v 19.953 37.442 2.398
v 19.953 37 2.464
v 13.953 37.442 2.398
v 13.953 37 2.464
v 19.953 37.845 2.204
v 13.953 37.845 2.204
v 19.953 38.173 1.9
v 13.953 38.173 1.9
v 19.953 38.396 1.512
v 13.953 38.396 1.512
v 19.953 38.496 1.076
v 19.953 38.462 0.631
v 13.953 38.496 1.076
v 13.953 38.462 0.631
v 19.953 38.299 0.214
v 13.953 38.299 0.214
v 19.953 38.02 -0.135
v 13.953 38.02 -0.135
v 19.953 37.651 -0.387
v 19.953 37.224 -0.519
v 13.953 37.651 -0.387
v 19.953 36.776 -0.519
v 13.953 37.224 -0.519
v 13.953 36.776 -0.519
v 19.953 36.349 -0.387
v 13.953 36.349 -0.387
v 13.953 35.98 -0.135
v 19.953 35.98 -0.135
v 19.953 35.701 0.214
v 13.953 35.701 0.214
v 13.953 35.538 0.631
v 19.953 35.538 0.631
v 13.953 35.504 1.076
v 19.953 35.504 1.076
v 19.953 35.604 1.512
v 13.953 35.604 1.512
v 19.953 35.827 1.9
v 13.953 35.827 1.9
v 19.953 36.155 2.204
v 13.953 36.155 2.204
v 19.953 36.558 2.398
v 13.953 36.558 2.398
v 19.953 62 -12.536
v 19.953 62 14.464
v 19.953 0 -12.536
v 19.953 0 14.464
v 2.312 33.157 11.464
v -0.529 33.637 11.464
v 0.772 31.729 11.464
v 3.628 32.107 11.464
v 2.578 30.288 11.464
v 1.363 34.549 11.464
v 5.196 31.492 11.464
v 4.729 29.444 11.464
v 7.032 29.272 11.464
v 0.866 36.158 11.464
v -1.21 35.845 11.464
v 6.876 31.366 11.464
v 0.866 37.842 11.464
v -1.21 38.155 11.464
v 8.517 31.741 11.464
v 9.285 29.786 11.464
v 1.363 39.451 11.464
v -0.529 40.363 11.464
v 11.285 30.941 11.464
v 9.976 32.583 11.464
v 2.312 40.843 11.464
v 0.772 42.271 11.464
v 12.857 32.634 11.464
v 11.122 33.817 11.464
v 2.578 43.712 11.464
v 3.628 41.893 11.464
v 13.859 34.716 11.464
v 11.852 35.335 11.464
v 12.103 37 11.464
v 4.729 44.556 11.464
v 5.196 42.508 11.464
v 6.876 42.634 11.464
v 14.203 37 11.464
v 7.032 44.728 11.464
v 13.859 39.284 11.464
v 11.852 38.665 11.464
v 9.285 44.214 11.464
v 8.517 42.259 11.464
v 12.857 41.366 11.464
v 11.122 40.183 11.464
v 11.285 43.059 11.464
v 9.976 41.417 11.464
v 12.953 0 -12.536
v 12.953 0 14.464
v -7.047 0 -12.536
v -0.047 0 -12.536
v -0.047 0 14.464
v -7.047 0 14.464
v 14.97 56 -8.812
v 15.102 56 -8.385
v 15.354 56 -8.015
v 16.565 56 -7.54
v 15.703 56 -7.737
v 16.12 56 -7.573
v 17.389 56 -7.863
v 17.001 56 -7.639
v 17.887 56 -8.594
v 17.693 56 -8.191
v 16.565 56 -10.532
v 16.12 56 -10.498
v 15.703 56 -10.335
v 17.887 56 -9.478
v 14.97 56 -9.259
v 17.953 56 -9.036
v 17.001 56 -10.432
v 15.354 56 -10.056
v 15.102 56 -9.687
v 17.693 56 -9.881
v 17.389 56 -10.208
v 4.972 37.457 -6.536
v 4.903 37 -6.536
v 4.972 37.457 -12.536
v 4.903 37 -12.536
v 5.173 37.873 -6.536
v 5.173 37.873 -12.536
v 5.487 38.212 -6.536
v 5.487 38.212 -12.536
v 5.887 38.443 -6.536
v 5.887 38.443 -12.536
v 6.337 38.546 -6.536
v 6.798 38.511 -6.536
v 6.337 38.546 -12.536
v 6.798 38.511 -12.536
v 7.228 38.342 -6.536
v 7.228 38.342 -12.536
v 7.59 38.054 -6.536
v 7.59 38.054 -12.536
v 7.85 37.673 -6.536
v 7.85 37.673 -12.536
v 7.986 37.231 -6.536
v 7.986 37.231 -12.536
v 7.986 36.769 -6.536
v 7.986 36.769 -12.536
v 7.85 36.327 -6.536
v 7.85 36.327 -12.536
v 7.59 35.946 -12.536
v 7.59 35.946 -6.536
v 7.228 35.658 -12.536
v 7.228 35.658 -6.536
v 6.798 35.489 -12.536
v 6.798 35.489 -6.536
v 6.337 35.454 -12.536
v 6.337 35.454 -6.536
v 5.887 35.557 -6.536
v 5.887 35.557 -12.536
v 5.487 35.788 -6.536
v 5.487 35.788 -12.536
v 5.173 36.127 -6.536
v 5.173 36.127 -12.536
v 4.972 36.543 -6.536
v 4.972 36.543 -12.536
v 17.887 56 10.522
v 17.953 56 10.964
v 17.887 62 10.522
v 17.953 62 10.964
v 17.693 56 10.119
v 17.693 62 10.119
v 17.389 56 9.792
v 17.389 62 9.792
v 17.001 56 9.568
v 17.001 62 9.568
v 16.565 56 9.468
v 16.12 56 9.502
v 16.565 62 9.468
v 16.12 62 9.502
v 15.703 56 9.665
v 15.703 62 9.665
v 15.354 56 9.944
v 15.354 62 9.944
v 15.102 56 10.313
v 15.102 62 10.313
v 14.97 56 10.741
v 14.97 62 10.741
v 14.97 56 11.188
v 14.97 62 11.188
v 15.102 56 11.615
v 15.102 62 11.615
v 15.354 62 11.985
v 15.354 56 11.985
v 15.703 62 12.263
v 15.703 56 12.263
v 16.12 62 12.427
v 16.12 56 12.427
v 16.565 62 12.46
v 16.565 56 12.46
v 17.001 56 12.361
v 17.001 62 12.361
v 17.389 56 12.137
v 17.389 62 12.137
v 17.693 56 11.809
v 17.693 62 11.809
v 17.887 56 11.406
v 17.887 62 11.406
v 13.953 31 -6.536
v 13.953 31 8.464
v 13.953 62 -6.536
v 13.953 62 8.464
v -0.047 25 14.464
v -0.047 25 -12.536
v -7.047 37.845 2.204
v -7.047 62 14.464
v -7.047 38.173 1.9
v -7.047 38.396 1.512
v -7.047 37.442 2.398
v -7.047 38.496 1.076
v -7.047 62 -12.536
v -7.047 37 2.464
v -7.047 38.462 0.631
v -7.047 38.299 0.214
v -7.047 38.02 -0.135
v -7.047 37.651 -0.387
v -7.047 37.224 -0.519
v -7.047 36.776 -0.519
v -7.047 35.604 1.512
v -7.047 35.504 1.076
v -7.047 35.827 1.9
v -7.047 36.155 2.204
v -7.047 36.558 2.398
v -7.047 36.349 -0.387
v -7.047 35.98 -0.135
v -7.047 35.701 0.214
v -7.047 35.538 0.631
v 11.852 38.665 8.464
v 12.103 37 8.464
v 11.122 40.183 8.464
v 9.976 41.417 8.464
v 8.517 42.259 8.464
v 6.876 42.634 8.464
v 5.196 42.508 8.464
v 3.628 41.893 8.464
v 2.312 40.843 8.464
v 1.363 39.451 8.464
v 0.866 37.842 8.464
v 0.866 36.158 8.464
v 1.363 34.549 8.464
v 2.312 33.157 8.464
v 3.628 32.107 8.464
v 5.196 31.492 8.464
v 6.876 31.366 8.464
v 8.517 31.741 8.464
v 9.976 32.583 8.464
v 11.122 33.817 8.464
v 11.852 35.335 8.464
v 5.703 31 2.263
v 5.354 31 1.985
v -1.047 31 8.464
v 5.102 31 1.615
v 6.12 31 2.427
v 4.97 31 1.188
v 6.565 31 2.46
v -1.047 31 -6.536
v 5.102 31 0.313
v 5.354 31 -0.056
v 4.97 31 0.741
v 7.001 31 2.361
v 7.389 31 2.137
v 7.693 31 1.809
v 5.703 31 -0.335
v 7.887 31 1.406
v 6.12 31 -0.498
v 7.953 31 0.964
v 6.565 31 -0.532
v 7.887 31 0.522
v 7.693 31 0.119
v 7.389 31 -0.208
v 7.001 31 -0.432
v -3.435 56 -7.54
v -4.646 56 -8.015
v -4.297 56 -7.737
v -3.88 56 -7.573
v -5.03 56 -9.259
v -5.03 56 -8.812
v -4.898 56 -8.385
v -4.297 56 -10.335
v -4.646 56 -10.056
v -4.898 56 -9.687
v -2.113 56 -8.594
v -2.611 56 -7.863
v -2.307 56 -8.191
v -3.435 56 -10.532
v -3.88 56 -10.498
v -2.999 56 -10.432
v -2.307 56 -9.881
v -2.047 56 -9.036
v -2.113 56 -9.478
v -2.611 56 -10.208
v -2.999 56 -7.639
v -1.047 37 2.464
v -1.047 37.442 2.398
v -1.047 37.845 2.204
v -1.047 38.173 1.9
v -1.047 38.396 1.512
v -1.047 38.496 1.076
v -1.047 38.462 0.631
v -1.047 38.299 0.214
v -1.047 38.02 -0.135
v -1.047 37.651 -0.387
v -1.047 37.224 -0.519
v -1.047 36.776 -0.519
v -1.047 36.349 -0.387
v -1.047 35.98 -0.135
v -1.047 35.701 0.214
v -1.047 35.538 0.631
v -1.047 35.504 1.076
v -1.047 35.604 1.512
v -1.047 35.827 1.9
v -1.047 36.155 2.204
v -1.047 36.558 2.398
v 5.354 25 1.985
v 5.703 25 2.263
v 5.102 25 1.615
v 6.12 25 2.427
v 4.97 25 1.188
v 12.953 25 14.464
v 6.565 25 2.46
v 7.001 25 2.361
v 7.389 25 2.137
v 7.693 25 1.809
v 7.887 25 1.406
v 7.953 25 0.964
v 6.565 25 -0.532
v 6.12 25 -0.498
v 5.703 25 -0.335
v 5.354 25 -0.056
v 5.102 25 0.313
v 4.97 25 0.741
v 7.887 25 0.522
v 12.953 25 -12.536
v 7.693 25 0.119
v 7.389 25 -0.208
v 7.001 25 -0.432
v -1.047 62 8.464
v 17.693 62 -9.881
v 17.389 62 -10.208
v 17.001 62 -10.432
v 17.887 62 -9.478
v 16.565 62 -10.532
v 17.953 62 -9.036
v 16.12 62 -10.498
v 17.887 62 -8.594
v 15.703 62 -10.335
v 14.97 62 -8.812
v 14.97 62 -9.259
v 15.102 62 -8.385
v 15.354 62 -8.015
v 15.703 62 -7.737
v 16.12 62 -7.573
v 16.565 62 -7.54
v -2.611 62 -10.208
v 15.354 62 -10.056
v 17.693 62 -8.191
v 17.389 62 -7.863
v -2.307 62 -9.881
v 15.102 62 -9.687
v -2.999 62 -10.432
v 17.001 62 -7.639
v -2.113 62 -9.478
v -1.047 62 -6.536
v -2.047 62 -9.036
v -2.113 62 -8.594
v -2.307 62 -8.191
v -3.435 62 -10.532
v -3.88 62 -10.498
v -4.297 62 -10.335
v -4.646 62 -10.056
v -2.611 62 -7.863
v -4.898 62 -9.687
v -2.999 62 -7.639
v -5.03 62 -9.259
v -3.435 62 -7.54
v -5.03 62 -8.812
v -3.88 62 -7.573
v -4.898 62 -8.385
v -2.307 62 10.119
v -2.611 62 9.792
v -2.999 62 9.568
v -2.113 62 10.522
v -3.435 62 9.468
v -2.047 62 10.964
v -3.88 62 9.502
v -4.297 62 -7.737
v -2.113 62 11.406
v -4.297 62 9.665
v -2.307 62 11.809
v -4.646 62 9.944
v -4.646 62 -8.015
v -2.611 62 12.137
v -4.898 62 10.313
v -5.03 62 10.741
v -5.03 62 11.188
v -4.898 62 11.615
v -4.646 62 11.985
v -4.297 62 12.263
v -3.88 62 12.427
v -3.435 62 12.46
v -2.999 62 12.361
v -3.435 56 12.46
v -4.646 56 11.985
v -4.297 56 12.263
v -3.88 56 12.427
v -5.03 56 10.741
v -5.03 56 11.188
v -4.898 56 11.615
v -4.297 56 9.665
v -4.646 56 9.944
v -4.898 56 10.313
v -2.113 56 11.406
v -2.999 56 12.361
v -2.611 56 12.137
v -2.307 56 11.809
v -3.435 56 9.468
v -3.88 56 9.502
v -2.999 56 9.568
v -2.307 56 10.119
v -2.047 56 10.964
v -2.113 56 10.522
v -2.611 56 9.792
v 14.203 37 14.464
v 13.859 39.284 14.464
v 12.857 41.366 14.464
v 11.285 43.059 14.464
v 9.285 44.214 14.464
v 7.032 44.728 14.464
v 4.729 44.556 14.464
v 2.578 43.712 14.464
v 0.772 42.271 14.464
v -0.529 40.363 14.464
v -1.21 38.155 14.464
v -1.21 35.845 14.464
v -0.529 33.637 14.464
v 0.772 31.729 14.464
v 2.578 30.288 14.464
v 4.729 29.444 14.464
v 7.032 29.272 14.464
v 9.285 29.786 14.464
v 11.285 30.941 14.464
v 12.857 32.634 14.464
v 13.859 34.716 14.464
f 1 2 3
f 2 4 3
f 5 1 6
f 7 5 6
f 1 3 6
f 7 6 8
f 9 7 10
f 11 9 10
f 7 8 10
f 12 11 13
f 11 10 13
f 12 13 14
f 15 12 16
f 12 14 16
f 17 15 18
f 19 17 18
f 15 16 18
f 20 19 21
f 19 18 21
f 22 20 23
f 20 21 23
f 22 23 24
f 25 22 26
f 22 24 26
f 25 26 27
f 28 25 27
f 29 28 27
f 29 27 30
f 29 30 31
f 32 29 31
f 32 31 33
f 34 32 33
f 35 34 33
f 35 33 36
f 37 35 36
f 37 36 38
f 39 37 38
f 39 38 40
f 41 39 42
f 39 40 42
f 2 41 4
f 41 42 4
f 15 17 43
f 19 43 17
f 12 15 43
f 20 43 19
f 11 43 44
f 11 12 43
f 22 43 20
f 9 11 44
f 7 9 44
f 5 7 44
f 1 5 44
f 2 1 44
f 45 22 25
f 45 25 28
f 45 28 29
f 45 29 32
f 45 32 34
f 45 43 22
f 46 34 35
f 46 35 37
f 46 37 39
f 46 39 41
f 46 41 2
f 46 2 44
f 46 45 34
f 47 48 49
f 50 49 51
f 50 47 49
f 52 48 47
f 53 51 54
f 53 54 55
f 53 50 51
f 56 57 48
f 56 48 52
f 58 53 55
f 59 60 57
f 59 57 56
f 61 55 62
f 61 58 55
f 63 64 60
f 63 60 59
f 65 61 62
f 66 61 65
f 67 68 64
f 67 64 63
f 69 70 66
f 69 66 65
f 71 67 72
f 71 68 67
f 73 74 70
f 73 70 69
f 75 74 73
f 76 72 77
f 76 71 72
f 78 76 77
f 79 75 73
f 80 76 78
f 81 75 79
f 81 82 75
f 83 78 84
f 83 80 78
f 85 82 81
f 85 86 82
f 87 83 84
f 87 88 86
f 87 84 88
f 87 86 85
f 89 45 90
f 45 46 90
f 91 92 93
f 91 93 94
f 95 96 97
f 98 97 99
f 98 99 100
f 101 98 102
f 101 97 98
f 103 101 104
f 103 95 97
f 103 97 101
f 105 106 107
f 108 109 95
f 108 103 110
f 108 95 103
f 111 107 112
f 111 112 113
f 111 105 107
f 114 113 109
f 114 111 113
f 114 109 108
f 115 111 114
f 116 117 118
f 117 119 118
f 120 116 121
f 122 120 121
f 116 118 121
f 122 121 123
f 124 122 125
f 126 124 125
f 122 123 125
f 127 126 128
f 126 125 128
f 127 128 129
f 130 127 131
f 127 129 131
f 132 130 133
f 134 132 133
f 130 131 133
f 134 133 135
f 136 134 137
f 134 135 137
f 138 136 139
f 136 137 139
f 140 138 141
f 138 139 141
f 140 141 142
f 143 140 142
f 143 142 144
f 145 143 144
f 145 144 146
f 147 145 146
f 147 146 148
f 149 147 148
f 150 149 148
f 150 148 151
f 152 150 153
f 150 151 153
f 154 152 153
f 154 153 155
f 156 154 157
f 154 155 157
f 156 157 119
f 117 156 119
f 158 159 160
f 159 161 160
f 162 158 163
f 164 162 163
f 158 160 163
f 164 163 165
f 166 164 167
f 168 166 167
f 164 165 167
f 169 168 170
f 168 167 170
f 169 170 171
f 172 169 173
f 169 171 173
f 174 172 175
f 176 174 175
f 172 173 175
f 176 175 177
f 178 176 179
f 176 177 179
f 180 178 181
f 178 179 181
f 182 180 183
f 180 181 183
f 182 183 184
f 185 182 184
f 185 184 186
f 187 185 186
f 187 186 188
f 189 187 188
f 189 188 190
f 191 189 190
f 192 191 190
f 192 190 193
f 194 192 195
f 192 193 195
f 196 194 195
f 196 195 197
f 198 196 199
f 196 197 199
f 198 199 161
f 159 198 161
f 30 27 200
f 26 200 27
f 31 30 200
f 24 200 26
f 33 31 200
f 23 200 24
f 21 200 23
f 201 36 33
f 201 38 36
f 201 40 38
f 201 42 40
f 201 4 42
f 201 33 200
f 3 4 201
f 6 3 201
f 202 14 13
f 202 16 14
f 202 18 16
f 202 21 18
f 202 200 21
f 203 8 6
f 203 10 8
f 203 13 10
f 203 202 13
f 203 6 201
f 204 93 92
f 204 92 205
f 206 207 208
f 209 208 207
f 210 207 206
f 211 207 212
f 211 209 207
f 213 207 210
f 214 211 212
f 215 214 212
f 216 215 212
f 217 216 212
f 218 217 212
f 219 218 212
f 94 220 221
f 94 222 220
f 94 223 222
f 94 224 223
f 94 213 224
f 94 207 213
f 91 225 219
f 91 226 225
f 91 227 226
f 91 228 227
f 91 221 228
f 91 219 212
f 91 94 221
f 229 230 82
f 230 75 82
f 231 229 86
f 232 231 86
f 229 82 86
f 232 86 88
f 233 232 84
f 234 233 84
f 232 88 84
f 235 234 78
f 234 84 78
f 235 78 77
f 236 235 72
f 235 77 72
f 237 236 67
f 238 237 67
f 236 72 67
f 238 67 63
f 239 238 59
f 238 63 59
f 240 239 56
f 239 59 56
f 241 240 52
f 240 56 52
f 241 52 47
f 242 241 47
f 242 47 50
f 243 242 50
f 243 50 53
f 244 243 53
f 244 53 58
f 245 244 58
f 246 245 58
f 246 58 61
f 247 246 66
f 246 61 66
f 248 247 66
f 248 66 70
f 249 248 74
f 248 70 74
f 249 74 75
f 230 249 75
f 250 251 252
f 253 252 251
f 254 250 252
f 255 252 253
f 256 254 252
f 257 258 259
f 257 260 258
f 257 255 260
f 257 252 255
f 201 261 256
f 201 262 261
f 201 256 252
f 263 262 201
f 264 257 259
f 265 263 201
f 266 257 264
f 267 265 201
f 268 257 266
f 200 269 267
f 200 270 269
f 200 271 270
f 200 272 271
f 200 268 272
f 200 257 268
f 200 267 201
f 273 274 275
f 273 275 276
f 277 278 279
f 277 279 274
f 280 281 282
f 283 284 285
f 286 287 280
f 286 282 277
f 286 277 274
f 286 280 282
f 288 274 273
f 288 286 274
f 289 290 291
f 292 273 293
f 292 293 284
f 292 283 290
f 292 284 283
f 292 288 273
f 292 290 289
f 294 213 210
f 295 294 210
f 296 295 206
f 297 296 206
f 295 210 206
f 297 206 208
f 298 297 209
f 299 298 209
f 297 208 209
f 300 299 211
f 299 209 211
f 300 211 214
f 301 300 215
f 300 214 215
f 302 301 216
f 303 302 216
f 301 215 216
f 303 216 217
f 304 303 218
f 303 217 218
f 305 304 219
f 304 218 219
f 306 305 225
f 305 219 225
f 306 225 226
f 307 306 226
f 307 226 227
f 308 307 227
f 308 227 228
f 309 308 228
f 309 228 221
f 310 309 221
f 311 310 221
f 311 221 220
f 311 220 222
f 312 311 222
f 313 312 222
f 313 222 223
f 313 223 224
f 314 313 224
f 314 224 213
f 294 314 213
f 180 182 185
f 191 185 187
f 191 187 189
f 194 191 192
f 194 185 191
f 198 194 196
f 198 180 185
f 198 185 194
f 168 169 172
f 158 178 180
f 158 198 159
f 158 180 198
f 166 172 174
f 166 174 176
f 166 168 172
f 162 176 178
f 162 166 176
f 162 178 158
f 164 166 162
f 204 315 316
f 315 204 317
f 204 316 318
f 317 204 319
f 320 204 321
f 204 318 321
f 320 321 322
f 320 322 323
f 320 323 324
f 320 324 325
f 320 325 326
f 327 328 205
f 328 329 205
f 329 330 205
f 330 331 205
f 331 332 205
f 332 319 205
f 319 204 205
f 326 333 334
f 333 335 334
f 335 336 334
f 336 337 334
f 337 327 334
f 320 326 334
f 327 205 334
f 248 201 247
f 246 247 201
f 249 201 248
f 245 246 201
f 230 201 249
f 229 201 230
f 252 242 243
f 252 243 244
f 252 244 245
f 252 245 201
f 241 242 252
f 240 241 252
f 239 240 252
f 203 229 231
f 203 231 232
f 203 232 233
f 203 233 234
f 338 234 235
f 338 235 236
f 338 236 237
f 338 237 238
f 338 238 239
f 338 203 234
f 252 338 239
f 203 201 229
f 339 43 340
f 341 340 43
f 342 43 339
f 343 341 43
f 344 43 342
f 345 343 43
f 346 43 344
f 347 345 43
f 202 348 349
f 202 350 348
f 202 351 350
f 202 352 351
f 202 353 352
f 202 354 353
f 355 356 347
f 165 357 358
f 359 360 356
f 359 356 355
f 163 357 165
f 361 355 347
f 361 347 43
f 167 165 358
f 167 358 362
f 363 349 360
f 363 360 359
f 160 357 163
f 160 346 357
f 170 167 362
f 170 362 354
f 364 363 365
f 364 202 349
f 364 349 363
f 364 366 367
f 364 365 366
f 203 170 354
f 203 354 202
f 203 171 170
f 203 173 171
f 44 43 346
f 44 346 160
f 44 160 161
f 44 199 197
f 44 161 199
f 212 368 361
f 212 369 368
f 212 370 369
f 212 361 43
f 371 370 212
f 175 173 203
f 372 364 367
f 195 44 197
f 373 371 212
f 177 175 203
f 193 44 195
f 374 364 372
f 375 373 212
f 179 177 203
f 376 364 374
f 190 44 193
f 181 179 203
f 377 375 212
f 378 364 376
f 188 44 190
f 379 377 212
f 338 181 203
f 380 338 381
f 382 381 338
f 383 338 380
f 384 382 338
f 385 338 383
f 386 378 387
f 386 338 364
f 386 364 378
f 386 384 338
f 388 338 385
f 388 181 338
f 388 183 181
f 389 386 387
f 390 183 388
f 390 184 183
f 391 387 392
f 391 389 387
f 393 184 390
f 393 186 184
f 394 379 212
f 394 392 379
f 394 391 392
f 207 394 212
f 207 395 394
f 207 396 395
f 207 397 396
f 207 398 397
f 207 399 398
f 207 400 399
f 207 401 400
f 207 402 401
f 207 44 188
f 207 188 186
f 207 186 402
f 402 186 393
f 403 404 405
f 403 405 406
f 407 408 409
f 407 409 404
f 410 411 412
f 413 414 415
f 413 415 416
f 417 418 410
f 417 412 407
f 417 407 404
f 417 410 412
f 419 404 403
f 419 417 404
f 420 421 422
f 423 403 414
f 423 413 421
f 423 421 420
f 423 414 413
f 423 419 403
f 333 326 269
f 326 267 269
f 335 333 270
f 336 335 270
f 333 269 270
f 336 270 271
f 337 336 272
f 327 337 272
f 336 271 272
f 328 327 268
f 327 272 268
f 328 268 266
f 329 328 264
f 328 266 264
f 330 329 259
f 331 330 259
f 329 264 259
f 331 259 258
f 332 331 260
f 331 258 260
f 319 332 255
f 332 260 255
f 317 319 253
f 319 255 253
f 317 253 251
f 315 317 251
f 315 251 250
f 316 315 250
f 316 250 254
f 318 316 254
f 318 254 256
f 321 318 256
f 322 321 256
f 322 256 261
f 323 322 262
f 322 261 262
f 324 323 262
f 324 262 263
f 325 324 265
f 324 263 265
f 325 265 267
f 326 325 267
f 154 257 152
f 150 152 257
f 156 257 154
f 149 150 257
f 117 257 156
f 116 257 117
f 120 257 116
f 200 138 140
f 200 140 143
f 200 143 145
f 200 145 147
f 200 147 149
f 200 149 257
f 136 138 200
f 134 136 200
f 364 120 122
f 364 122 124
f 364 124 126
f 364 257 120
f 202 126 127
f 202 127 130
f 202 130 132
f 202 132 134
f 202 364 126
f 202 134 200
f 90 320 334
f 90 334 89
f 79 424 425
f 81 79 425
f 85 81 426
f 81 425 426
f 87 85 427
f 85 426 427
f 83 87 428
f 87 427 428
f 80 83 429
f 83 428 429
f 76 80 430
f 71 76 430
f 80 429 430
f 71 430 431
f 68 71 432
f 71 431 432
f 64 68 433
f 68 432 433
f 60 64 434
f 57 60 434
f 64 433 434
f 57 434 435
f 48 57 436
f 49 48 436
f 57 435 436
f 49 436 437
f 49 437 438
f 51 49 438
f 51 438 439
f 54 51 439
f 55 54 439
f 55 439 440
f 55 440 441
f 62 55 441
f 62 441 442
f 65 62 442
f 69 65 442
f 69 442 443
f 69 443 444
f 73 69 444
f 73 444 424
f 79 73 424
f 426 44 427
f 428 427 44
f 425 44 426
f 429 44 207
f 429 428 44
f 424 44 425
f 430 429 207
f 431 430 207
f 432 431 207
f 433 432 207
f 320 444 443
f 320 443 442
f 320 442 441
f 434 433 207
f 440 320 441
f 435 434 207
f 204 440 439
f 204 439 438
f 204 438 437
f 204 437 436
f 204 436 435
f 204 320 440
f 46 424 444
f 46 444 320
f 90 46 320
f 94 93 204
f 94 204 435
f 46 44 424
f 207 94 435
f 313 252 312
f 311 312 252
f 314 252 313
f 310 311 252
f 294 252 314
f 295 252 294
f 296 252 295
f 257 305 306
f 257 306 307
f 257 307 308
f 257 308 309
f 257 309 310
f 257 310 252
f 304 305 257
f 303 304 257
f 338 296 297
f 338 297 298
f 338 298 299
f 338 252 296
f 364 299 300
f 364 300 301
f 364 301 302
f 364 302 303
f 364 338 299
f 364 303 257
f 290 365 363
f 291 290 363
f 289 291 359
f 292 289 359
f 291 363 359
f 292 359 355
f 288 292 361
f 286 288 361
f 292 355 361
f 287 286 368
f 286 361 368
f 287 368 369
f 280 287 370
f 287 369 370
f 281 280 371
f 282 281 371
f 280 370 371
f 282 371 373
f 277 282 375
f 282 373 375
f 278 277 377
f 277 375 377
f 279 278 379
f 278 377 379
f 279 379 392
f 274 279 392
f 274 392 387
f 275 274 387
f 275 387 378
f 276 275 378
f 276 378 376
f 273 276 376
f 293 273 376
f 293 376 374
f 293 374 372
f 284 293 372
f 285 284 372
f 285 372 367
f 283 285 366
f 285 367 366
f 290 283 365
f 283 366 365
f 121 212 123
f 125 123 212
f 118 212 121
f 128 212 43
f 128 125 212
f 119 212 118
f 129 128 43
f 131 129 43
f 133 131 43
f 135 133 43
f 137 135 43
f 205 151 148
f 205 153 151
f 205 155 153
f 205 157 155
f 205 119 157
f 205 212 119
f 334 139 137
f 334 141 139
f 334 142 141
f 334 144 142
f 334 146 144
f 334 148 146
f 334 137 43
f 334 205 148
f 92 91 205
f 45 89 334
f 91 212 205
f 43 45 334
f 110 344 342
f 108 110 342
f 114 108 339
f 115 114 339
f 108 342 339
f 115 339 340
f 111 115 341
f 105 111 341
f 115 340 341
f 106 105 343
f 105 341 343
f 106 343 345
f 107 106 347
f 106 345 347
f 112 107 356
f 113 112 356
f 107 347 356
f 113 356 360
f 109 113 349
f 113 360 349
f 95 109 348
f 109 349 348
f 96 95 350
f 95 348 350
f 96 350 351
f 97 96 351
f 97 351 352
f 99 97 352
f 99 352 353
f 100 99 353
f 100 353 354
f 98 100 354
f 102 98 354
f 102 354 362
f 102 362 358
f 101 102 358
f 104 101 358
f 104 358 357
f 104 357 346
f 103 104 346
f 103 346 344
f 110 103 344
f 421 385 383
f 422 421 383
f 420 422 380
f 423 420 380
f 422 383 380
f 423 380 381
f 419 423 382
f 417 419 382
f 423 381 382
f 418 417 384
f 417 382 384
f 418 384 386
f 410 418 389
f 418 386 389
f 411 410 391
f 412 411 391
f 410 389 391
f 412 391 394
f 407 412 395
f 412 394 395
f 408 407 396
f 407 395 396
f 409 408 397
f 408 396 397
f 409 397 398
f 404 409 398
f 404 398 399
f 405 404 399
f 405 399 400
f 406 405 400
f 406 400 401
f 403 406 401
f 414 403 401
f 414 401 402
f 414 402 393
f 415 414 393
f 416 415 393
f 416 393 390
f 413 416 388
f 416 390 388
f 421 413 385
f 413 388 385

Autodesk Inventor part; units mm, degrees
ref_plane "YZ Plane" through (0, 0, 0) normal (1, 0, 0) x (0, 1, 0)
ref_plane "XZ Plane" through (0, 0, 0) normal (0, 1, 0) x (-1, 0, 0)
ref_plane "XY Plane" through (0, 0, 0) normal (0, 0, 1) x (1, 0, 0)
sketch "Boceto1" plane through (0, 0, 0) normal (0, 1, 0) x (-1, 0, 0)
  line L0 (-19.9533, 14.4643) -> (7.0467, 14.4643)
  line L1 (7.0467, 14.4643) -> (7.0467, -12.5357)
  line L2 (7.0467, -12.5357) -> (-19.9533, -12.5357)
  line L3 (-19.9533, -12.5357) -> (-19.9533, 14.4643)
  point P0 (0, 0)
  dimension "d0" = 27
  dimension "d1" = 27
extrude "Extrusión1" add sketch "Boceto1" along normal blind 62
sketch "Boceto2" plane through (0, 62, 0) normal (0, 1, 0) x (1, 0, 0)
  line L0 (-7.0467, -14.4643) -> (19.9533, -14.4643) projected
  line L1 (19.9533, -14.4643) -> (19.9533, 12.5357) projected
  line L2 (19.9533, 12.5357) -> (-7.0467, 12.5357) projected
  line L3 (-7.0467, 12.5357) -> (-7.0467, -14.4643) projected
  line L4 (-1.0467, 6.5357) -> (13.9533, 6.5357)
  line L5 (13.9533, 6.5357) -> (13.9533, -8.4643)
  line L6 (13.9533, -8.4643) -> (-1.0467, -8.4643)
  line L7 (-1.0467, -8.4643) -> (-1.0467, 6.5357)
  point P0 (0, 0)
  dimension "d4" = 6
  dimension "d5" = 6
  dimension "d6" = 6
  dimension "d7" = 6
extrude "Extrusión2" cut sketch "Boceto2" against normal blind 31 contours L4 L5 L6 L7
sketch "Boceto3" plane through (19.9533, 0, -12.5357) normal (0, 0, -1) x (-1, 0, 0)
  line L0 (27, 0) -> (0, 0) projected
  line L1 (27, 0) -> (27, 62) projected
  line L2 (0, 0) -> (0, 62) projected
  line L3 (20, 25) -> (7, 25)
  line L4 (7, 25) -> (7, 0)
  line L5 (7, 0) -> (20, 0)
  line L6 (20, 0) -> (20, 25)
  line L7 (0, 62) -> (27, 62) projected
  circle A0 centre (13.5, 39) radius 2.55
  point P0 (19.9533, 0)
  dimension "d10" = 7
  dimension "d11" = 7
  dimension "d12" = 25
  dimension "d16" = 5.1
  dimension "d17" = 13.5
  dimension "d18" = 23
extrude "Extrusión3" cut sketch "Boceto3" against normal blind 30 contours L0 L4 L3 L6
sketch "Boceto4" plane through (19.9533, 62, -12.5357) normal (0, 0, -1) x (-1, 0, 0)
  line L0 (0, -62) -> (0, 0) projected
  circle A0 centre (13.5, -25) radius 1.55
  line L1 (21, -31) -> (6, -31) projected
  point P0 (19.9533, -62)
  dimension "d19" = 3.1
  dimension "d20" = 13.5
  dimension "d34" = 6
extrude "Extrusión4" cut sketch "Boceto4" against normal blind 7
sketch "Boceto5" plane through (-7.0467, 62, 14.4643) normal (0, 0, 1) x (1, 0, 0)
  line L0 (27, -62) -> (27, 0) projected
  circle A0 centre (13.5, -25) radius 7.75
  line L1 (21, -31) -> (6, -31) projected
  point P0 (7.0467, -62)
  dimension "d24" = 15.5
  dimension "d25" = 13.5
  dimension "d33" = 6
extrude "Extrusión5" cut sketch "Boceto5" against normal blind 3
sketch "Boceto6" plane through (6.4533, 37, 11.4643) normal (0, 0, 1) x (1, 0, 0)
  circle A0 centre (0, 0) radius 7.75 projected
  circle A1 centre (0, 0) radius 5.65
  point P0 (-6.4533, -37)
  dimension "d29" = 11.3
extrude "Extrusión6" cut sketch "Boceto6" against normal blind 3 contours A1
sketch "Boceto8" plane through (-7.0467, 0, -12.5357) normal (-1, 0, 0) x (0, 0, 1)
  line L0 (27, 0) -> (27, 62) projected
  circle A0 centre (13.5, 37) radius 1.5
  line L1 (0, 25) -> (27, 25) projected
  line L2 (0, 25) -> (27, 25) projected
  point P0 (12.5357, 0)
  dimension "d42" = 13.5
  dimension "d43" = 3
  dimension "d47" = 12
extrude "Extrusión8" cut sketch "Boceto8" against normal through all
sketch "Boceto9" plane through (0, 62, 0) normal (0, 1, 0) x (1, 0, 0)
  line L0 (-7.0467, -14.4643) -> (19.9533, -14.4643) projected
  line L1 (19.9533, -14.4643) -> (19.9533, 12.5357) projected
  line L2 (19.9533, 12.5357) -> (-7.0467, 12.5357) projected
  line L3 (-7.0467, 12.5357) -> (-7.0467, -14.4643) projected
  circle A0 centre (-3.5467, 9.0357) radius 1.5
  circle A1 centre (16.4533, 9.0357) radius 1.5
  circle A2 centre (-3.5467, -10.9643) radius 1.5
  circle A3 centre (16.4533, -10.9643) radius 1.5
  point P0 (0, 0)
  dimension "d48" = 3
  dimension "d49" = 3.5
  dimension "d50" = 3.5
  dimension "d51" = 3.5
  dimension "d52" = 3.5
  dimension "d53" = 3
  dimension "d54" = 3
  dimension "d55" = 3.5
  dimension "d56" = 3.5
  dimension "d57" = 3.5
  dimension "d58" = 3.5
  dimension "d59" = 3
extrude "Extrusión9" cut sketch "Boceto9" against normal blind 6 contours A0 | A1 | A2 | A3
sketch "Boceto10" plane through (0, 31, 0) normal (0, 1, 0) x (1, 0, 0)
  line L0 (-1.0467, 6.5357) -> (13.9533, 6.5357) projected
  line L1 (13.9533, 6.5357) -> (13.9533, -8.4643) projected
  circle A0 centre (6.4533, -0.9643) radius 1.5
  point P0 (0, 0)
  dimension "d62" = 3
  dimension "d63" = 7.5
  dimension "d64" = 7.5
extrude "Extrusión10" cut sketch "Boceto10" against normal through all
properties part number "Cubeta Final"
